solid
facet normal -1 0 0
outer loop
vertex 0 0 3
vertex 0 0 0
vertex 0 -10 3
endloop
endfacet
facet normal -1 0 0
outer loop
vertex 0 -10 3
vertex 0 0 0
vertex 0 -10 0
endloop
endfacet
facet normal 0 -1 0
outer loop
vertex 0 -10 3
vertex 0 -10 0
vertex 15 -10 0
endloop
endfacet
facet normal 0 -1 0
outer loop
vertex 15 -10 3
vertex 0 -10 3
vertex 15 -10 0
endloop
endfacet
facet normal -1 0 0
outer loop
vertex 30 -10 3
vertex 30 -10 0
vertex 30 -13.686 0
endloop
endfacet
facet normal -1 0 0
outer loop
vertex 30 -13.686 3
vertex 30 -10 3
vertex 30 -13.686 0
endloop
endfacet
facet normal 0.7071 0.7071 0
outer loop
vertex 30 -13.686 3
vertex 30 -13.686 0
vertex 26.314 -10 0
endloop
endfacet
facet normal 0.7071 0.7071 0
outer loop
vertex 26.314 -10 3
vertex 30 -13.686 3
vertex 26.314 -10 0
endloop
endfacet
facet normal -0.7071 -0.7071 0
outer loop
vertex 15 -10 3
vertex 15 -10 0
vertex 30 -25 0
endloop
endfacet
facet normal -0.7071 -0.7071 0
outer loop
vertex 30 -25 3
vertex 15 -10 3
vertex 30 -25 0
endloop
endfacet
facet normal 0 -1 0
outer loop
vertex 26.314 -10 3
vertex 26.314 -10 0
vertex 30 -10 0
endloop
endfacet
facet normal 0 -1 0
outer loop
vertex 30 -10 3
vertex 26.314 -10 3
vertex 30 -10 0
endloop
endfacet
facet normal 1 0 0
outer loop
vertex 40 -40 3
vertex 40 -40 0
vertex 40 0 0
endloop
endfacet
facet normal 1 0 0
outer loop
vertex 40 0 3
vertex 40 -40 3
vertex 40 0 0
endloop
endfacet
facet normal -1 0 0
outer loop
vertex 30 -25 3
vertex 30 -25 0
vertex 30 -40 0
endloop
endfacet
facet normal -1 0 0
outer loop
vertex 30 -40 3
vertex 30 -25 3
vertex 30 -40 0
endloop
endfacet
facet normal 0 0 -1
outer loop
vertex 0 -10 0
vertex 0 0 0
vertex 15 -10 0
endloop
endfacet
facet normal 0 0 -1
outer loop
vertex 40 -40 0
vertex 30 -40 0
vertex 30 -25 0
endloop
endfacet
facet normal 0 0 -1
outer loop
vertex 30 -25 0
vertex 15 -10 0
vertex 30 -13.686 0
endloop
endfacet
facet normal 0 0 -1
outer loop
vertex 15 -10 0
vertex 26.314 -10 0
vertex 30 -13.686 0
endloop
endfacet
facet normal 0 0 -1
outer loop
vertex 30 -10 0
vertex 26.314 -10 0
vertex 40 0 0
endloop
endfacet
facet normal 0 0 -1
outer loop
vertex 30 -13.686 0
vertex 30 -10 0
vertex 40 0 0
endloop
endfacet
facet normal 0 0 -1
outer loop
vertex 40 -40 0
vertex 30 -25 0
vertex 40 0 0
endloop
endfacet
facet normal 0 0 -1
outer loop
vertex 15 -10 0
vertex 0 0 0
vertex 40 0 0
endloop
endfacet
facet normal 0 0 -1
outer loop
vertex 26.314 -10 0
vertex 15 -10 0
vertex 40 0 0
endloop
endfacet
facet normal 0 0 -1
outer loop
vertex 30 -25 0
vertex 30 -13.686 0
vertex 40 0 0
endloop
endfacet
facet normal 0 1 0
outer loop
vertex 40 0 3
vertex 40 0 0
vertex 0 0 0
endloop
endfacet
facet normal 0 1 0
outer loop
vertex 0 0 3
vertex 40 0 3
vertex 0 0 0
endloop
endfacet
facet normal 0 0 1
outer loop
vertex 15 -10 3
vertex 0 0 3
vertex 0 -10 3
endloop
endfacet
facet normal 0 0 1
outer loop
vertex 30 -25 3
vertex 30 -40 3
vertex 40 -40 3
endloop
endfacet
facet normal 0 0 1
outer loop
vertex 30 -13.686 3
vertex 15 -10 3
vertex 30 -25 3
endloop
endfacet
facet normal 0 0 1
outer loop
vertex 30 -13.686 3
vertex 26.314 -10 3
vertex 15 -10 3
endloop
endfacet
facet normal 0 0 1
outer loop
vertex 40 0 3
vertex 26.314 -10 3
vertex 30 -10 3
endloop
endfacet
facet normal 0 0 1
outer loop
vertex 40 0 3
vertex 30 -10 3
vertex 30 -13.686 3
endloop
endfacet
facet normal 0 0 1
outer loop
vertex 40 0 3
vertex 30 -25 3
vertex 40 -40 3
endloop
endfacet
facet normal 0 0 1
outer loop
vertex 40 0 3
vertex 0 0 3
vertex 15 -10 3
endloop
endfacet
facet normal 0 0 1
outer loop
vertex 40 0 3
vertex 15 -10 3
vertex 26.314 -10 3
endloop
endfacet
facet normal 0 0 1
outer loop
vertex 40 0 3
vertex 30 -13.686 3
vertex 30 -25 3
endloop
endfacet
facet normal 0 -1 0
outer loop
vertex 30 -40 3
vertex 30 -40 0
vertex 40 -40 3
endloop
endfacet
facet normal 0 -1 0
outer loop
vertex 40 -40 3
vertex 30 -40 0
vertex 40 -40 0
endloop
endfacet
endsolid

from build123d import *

# Parameters (mm, degrees)
EXTRUDE_1_DEPTH = 3


with BuildPart() as part:
    # 草圖1 → 填料-伸長1 (new body)
    with BuildSketch(Plane.XY):
        Polygon((0, -10), (30, -10), (30, -40), (40, -40), (40, -10), (40, 0), (0, 0), align=None)
        Polygon((30, -13.686291501), (26.313708499, -10), (15, -10), (30, -25), align=None)
    extrude(amount=EXTRUDE_1_DEPTH)


solid = part.part
